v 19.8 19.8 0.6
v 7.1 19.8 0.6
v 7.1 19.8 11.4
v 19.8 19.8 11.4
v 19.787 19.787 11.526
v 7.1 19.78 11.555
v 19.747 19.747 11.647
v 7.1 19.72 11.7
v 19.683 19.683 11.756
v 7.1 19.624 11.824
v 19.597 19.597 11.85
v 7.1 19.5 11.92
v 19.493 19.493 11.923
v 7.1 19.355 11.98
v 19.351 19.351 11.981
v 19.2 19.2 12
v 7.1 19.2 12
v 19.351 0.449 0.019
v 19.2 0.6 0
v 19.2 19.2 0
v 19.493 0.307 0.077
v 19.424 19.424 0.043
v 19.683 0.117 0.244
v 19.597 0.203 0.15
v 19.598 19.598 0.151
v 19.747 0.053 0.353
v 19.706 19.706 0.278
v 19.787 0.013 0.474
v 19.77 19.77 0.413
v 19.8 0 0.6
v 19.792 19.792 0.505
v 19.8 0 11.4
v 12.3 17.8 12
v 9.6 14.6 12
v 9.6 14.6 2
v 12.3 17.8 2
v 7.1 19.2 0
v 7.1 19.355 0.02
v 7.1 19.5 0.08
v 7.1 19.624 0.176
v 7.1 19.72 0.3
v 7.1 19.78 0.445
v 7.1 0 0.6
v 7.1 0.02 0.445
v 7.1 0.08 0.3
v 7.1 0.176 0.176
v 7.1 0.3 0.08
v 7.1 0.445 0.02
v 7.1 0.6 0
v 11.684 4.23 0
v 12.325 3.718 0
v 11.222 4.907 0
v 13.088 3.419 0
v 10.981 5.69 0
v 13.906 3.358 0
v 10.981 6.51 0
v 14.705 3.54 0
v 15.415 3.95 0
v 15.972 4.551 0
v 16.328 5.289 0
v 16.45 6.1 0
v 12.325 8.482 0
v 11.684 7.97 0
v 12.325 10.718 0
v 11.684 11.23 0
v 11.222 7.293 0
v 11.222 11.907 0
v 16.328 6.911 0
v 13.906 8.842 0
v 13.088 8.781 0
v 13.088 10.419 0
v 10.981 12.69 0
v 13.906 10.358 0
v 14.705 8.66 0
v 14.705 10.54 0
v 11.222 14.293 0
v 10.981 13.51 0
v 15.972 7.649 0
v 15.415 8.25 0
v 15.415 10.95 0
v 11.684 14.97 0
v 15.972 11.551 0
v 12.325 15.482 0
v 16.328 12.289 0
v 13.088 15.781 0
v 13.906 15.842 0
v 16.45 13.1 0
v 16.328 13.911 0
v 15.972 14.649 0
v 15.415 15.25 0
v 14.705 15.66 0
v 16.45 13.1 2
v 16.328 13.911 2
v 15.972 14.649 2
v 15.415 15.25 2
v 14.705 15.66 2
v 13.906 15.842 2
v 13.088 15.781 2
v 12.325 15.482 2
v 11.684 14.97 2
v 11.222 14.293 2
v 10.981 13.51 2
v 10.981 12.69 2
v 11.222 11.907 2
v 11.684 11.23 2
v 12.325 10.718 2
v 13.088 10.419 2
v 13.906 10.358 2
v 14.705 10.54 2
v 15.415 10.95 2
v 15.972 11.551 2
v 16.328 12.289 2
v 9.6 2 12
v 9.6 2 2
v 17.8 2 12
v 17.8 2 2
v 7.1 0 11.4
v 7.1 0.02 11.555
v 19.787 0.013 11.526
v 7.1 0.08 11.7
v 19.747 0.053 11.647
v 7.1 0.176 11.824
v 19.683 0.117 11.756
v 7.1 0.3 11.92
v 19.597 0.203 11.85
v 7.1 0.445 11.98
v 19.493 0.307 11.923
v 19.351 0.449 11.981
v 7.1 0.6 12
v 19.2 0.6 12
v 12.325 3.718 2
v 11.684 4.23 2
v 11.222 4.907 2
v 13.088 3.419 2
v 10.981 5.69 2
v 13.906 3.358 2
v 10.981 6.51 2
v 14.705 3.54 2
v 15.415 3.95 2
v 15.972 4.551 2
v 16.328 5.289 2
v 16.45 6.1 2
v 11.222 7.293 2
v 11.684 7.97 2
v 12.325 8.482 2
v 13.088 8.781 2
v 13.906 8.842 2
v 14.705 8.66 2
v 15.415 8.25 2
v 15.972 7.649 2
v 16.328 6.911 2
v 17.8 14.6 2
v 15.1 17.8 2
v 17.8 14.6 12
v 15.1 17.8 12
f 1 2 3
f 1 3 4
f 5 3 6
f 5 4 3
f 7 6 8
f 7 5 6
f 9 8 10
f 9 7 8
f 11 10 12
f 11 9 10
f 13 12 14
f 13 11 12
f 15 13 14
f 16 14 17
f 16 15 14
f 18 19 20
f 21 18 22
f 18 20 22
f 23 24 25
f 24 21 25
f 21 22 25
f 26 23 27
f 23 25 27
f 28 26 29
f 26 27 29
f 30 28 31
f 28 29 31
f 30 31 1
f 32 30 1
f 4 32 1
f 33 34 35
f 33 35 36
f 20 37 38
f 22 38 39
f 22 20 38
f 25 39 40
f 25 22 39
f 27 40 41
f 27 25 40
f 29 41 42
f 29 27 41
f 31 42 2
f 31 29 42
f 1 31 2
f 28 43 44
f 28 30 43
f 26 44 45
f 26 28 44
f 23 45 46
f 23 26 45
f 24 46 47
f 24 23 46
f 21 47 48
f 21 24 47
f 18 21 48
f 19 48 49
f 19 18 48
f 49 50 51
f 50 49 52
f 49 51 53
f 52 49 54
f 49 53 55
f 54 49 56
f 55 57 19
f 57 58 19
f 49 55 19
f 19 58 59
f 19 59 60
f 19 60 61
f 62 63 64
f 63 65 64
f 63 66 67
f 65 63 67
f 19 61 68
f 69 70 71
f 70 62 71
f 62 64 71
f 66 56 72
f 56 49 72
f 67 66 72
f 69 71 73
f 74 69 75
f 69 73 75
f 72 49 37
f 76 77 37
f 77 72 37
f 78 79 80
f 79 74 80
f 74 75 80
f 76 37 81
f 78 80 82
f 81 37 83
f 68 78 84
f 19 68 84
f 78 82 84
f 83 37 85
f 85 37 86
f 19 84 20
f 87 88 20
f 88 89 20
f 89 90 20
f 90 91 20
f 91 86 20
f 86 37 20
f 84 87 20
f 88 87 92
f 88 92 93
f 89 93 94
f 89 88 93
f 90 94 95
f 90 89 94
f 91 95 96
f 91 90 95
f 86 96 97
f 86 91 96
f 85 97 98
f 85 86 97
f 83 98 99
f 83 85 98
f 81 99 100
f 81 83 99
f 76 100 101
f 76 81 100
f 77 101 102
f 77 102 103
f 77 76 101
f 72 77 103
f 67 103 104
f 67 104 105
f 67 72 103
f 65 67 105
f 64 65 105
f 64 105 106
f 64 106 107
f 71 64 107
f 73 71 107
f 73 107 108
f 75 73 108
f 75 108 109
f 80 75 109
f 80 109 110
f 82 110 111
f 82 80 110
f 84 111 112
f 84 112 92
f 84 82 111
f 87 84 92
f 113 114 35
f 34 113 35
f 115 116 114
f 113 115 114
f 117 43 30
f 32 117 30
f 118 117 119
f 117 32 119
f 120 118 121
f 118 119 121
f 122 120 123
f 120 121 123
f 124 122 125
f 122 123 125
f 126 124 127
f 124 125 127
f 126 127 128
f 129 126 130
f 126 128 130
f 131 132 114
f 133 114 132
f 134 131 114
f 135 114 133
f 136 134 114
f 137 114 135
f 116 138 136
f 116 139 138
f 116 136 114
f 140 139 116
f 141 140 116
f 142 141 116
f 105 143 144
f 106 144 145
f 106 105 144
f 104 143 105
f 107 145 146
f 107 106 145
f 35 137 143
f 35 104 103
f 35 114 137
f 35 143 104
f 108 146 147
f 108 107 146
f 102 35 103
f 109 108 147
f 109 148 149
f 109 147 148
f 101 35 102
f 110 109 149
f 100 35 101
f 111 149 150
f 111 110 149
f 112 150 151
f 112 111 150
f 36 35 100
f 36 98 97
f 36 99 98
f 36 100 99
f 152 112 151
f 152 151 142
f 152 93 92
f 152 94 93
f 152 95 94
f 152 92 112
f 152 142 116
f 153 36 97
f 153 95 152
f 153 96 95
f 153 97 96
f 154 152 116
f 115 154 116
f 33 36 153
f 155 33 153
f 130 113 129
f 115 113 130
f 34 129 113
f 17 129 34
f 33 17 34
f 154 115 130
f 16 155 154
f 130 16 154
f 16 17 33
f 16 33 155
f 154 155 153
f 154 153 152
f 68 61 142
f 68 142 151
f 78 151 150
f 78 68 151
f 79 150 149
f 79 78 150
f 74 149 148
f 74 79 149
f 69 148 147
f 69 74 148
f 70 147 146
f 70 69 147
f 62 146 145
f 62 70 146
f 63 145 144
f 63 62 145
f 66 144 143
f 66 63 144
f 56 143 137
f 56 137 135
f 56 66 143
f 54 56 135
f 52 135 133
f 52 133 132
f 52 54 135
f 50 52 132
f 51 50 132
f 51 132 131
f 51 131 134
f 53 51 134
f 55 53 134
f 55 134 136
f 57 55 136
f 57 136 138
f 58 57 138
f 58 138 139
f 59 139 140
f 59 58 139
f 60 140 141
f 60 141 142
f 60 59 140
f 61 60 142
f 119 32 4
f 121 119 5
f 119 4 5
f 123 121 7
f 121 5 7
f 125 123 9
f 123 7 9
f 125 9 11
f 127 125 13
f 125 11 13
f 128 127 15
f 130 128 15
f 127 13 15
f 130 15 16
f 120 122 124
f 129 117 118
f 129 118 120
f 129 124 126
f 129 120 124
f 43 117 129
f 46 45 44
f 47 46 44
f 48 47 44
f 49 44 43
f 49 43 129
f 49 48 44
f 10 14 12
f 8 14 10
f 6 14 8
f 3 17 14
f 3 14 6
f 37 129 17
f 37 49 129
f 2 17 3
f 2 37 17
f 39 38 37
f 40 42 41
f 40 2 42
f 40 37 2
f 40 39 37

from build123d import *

# Parameters (mm, degrees)
F0_W     = 12.7
F0_H     = 19.8
F1_DEPTH = 12
F0_R     = 2.75
F2_DEPTH = 2
F3_R     = 0.6
F4_R     = 0.6


# Not quite as in the source:
# - a feature names something its author has since deleted; it is built from what else it names


with BuildPart() as f1:
    # F0 (on Top) → F1 (new body)
    with BuildSketch(Plane.XY):
        with Locations((13.45, 9.9)):
            Rectangle(F0_W, F0_H)
        Polygon((17.8, 14.6), (17.8, 2), (9.6, 2), (9.6, 14.6), (12.3, 17.8), (15.1, 17.8), align=None, mode=Mode.SUBTRACT)
    extrude(amount=F1_DEPTH)

    # F0 (on Top) → F2 (join)
    with BuildSketch(Plane.XY):
        Polygon((9.6, 2), (17.8, 2), (17.8, 14.6), (15.1, 17.8), (12.3, 17.8), (9.6, 14.6), align=None)
        with Locations((13.7, 6.1)):
            Circle(F0_R, mode=Mode.SUBTRACT)
        with Locations((13.7, 13.1)):
            Circle(F0_R, mode=Mode.SUBTRACT)
    extrude(amount=F2_DEPTH)

    # F3
    f3_edges = [f1.edges().sort_by_distance(p)[0] for p in [
        (13.45, 0, 12),
        (19.8, 9.9, 12),
        (13.45, 19.8, 12),
    ]]
    fillet(f3_edges, radius=F3_R)

    # F4
    f4_edges = [f1.edges().sort_by_distance(p)[0] for p in [
        (13.45, 0, 0),
        (19.8, 9.9, 0),
        (13.45, 19.8, 0),
    ]]
    fillet(f4_edges, radius=F4_R)


solid = f1.part
